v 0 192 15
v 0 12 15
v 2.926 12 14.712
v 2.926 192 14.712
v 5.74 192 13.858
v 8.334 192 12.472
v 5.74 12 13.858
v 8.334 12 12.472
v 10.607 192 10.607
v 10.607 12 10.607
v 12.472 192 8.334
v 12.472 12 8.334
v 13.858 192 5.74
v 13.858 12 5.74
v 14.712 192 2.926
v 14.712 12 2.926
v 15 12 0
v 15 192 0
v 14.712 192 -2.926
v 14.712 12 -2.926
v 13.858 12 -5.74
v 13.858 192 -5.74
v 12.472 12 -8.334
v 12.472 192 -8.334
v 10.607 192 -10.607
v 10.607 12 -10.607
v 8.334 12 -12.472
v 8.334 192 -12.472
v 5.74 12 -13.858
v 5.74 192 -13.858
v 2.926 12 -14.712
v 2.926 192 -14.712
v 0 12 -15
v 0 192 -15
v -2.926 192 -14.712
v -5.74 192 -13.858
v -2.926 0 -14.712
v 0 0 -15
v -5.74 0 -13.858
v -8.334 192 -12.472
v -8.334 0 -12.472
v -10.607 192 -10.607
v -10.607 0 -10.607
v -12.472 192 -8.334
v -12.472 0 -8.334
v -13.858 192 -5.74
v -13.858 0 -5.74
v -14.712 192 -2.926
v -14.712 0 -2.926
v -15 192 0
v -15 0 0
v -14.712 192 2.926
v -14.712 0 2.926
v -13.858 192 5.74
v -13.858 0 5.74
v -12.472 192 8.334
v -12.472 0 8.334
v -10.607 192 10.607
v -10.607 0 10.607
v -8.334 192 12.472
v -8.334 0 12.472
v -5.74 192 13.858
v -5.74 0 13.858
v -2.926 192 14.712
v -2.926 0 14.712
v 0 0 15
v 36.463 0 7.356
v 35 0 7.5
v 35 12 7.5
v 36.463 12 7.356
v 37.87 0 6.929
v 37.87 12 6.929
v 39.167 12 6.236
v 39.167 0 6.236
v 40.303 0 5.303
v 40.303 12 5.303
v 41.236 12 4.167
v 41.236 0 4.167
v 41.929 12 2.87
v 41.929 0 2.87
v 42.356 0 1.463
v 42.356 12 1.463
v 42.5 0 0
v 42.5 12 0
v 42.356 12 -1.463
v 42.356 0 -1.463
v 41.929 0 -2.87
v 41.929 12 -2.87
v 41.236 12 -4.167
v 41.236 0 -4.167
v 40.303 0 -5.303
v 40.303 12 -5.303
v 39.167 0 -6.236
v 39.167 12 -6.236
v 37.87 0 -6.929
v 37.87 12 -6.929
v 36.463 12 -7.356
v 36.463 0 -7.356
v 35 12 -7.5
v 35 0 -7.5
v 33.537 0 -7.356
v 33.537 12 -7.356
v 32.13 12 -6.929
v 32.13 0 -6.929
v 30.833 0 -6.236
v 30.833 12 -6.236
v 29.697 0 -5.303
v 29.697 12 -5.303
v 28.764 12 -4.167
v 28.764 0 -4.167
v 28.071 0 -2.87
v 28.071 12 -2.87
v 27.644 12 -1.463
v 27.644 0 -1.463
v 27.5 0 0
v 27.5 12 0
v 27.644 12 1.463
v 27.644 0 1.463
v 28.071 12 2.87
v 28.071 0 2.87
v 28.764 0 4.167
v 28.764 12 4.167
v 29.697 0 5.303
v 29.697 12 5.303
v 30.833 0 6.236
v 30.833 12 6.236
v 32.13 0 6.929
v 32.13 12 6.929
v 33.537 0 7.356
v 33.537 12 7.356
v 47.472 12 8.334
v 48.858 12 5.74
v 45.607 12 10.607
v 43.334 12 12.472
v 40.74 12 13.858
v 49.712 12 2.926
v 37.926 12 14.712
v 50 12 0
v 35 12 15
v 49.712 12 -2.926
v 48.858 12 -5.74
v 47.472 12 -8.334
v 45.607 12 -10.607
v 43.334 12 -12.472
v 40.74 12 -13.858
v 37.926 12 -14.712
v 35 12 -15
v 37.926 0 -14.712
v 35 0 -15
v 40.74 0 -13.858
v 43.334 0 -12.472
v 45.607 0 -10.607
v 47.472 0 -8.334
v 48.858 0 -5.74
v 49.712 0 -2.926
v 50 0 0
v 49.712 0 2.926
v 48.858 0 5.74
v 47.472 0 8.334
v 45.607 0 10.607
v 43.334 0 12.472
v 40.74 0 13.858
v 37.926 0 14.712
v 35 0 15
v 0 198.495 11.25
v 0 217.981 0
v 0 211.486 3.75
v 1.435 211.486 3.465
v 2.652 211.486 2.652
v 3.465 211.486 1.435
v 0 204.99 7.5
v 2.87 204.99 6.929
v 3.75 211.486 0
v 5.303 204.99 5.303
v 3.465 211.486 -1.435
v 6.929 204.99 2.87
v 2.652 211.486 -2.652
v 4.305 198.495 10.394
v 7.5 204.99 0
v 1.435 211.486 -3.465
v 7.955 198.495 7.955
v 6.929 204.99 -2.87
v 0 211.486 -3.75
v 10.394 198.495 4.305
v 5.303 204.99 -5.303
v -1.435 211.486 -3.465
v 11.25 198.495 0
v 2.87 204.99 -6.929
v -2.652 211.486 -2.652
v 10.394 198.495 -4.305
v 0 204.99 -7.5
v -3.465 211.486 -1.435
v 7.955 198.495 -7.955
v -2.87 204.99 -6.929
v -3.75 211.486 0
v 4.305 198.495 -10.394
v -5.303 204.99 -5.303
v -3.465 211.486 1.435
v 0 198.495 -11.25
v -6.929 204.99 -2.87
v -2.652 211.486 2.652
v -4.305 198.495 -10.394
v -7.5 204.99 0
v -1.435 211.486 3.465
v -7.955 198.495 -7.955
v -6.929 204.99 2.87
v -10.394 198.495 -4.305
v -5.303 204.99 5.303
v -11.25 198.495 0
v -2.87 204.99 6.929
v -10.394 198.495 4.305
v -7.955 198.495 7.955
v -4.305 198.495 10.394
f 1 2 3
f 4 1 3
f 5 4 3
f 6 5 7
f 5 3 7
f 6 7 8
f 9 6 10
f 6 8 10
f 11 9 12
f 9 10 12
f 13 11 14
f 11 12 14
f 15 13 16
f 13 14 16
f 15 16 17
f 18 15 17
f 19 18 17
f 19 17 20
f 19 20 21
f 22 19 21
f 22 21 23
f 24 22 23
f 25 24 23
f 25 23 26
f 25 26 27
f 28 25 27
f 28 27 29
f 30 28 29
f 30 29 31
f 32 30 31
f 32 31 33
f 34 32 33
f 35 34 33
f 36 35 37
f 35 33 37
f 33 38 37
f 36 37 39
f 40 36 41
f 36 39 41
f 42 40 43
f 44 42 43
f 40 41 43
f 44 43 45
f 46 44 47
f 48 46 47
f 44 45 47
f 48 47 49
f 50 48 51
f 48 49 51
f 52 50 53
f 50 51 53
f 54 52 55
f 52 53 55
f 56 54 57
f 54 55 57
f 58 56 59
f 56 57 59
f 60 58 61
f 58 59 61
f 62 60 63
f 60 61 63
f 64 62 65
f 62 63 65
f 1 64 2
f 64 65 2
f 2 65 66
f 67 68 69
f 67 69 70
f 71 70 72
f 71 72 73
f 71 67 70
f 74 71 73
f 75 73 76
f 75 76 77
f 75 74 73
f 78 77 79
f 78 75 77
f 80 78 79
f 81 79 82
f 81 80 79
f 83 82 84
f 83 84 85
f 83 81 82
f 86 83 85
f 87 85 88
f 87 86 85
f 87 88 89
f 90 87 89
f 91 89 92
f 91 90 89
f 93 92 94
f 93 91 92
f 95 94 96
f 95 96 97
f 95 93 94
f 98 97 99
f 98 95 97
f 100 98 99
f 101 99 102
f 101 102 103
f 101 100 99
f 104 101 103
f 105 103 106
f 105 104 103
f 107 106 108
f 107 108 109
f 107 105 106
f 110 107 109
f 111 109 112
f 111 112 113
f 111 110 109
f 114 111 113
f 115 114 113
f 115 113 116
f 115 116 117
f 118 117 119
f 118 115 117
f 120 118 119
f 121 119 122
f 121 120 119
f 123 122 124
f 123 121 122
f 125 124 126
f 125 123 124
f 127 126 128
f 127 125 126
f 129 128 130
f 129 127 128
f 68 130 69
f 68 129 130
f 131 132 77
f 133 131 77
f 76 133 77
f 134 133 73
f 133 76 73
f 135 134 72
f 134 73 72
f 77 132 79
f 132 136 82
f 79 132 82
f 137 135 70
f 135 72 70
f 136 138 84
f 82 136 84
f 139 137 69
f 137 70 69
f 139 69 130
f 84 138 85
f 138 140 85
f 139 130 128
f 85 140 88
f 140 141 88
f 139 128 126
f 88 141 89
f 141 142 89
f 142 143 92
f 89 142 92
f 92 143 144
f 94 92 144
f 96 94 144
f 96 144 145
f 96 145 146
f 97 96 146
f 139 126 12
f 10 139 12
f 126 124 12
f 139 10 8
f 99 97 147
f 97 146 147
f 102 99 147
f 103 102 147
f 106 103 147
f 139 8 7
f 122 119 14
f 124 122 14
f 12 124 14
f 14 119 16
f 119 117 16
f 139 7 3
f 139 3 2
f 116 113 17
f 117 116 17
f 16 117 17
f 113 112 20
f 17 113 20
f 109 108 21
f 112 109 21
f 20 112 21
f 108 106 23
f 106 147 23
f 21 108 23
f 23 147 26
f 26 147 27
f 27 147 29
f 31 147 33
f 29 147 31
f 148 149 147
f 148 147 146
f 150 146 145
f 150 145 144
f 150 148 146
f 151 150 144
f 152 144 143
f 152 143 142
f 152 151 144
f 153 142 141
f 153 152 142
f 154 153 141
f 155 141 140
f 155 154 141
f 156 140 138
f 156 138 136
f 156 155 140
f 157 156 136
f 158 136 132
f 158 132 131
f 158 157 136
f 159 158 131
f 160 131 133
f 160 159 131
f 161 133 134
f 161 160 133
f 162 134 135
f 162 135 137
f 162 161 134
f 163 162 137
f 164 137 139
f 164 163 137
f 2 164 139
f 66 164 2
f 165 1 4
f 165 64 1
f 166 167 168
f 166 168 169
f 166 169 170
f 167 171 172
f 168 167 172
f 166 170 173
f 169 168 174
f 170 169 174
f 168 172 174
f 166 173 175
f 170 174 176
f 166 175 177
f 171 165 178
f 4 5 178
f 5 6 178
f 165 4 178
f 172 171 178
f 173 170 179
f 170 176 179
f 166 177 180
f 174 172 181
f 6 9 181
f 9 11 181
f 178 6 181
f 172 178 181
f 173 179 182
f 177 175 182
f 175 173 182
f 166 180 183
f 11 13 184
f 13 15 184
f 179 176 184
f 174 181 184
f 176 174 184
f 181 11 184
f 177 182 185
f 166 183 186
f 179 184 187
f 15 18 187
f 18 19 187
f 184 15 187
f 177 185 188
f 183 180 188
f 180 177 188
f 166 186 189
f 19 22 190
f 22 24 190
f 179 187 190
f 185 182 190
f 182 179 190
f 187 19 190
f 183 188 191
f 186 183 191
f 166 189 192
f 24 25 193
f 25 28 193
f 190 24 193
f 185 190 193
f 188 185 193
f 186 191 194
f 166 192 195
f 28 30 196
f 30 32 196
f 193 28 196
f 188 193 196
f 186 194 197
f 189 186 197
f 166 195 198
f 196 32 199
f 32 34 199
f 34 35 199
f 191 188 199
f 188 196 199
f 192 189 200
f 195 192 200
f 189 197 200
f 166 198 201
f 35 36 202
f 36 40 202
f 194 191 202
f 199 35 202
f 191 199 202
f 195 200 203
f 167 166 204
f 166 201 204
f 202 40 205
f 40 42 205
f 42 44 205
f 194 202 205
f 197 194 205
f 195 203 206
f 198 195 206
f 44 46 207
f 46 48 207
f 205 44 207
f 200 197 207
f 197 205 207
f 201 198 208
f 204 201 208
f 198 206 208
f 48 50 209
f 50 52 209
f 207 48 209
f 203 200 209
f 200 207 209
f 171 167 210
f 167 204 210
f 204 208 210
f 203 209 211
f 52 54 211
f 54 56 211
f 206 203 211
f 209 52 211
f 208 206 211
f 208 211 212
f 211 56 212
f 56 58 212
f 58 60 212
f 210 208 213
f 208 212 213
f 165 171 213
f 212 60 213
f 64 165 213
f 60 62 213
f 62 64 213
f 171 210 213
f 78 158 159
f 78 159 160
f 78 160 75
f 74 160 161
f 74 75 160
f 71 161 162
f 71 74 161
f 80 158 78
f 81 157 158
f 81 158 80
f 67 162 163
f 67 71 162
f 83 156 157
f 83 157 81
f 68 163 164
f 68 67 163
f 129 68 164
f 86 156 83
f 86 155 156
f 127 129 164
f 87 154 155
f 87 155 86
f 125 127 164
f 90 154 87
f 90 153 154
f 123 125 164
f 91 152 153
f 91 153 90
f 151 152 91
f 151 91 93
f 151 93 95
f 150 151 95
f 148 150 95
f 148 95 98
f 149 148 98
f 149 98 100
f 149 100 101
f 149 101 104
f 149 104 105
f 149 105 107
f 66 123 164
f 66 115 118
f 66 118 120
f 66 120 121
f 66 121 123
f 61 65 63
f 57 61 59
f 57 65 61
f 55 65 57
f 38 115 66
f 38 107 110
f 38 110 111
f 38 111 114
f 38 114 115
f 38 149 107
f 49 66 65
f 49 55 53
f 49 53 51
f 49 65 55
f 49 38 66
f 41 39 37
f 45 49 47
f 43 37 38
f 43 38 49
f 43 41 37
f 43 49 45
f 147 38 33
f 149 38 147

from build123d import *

# Parameters (mm, degrees)
SKETCH1_R           = 7.5
BOSS_EXTRUDE1_DEPTH = 12
SKETCH2_R           = 15
BOSS_EXTRUDE2_DEPTH = 180


with BuildPart() as part:
    # Sketch1 → Boss-Extrude1 (new body)
    with BuildSketch(Plane(origin=(0, 0, 0), x_dir=(1, 0, 0), z_dir=(0, 1, 0))):
        with BuildLine():
            Line((0, 15), (35, 15))
            ThreePointArc((35, 15), (50, 0), (35, -15))
            Line((35, -15), (0, -15))
            ThreePointArc((0, -15), (-15, 0), (0, 15))
        make_face()
        with Locations(Location((35, 0, 0), (0, 0, 270))):  # turned: the seam where the file's is
            Circle(SKETCH1_R, mode=Mode.SUBTRACT)
    extrude(amount=BOSS_EXTRUDE1_DEPTH)

    # Sketch2 → Boss-Extrude2 (add)
    with BuildSketch(Plane(origin=(0, 12, 0), x_dir=(1, 0, 0), z_dir=(0, 1, 0))):
        with Locations(Location((0, 0, 0), (0, 0, 270))):  # turned: the seam where the file's is
            Circle(SKETCH2_R)
    extrude(amount=BOSS_EXTRUDE2_DEPTH)

    # Sketch3 → Revolve1 (revolve)
    with BuildSketch(Plane(origin=(0, 0, 0), x_dir=(0, 0, -1), z_dir=(1, 0, 0)), mode=Mode.PRIVATE) as revolve1_sk:
        Polygon((15, 192), (0, 192), (0, 217.980762114), align=None)
    revolve(revolve1_sk.sketch.rotate(Axis((0, -19.330259434, 0), (0, 1, 0)), 180), axis=Axis((0, -19.330259434, 0), (0, 1, 0)))  # turned: the seam where the file's is


solid = part.part
